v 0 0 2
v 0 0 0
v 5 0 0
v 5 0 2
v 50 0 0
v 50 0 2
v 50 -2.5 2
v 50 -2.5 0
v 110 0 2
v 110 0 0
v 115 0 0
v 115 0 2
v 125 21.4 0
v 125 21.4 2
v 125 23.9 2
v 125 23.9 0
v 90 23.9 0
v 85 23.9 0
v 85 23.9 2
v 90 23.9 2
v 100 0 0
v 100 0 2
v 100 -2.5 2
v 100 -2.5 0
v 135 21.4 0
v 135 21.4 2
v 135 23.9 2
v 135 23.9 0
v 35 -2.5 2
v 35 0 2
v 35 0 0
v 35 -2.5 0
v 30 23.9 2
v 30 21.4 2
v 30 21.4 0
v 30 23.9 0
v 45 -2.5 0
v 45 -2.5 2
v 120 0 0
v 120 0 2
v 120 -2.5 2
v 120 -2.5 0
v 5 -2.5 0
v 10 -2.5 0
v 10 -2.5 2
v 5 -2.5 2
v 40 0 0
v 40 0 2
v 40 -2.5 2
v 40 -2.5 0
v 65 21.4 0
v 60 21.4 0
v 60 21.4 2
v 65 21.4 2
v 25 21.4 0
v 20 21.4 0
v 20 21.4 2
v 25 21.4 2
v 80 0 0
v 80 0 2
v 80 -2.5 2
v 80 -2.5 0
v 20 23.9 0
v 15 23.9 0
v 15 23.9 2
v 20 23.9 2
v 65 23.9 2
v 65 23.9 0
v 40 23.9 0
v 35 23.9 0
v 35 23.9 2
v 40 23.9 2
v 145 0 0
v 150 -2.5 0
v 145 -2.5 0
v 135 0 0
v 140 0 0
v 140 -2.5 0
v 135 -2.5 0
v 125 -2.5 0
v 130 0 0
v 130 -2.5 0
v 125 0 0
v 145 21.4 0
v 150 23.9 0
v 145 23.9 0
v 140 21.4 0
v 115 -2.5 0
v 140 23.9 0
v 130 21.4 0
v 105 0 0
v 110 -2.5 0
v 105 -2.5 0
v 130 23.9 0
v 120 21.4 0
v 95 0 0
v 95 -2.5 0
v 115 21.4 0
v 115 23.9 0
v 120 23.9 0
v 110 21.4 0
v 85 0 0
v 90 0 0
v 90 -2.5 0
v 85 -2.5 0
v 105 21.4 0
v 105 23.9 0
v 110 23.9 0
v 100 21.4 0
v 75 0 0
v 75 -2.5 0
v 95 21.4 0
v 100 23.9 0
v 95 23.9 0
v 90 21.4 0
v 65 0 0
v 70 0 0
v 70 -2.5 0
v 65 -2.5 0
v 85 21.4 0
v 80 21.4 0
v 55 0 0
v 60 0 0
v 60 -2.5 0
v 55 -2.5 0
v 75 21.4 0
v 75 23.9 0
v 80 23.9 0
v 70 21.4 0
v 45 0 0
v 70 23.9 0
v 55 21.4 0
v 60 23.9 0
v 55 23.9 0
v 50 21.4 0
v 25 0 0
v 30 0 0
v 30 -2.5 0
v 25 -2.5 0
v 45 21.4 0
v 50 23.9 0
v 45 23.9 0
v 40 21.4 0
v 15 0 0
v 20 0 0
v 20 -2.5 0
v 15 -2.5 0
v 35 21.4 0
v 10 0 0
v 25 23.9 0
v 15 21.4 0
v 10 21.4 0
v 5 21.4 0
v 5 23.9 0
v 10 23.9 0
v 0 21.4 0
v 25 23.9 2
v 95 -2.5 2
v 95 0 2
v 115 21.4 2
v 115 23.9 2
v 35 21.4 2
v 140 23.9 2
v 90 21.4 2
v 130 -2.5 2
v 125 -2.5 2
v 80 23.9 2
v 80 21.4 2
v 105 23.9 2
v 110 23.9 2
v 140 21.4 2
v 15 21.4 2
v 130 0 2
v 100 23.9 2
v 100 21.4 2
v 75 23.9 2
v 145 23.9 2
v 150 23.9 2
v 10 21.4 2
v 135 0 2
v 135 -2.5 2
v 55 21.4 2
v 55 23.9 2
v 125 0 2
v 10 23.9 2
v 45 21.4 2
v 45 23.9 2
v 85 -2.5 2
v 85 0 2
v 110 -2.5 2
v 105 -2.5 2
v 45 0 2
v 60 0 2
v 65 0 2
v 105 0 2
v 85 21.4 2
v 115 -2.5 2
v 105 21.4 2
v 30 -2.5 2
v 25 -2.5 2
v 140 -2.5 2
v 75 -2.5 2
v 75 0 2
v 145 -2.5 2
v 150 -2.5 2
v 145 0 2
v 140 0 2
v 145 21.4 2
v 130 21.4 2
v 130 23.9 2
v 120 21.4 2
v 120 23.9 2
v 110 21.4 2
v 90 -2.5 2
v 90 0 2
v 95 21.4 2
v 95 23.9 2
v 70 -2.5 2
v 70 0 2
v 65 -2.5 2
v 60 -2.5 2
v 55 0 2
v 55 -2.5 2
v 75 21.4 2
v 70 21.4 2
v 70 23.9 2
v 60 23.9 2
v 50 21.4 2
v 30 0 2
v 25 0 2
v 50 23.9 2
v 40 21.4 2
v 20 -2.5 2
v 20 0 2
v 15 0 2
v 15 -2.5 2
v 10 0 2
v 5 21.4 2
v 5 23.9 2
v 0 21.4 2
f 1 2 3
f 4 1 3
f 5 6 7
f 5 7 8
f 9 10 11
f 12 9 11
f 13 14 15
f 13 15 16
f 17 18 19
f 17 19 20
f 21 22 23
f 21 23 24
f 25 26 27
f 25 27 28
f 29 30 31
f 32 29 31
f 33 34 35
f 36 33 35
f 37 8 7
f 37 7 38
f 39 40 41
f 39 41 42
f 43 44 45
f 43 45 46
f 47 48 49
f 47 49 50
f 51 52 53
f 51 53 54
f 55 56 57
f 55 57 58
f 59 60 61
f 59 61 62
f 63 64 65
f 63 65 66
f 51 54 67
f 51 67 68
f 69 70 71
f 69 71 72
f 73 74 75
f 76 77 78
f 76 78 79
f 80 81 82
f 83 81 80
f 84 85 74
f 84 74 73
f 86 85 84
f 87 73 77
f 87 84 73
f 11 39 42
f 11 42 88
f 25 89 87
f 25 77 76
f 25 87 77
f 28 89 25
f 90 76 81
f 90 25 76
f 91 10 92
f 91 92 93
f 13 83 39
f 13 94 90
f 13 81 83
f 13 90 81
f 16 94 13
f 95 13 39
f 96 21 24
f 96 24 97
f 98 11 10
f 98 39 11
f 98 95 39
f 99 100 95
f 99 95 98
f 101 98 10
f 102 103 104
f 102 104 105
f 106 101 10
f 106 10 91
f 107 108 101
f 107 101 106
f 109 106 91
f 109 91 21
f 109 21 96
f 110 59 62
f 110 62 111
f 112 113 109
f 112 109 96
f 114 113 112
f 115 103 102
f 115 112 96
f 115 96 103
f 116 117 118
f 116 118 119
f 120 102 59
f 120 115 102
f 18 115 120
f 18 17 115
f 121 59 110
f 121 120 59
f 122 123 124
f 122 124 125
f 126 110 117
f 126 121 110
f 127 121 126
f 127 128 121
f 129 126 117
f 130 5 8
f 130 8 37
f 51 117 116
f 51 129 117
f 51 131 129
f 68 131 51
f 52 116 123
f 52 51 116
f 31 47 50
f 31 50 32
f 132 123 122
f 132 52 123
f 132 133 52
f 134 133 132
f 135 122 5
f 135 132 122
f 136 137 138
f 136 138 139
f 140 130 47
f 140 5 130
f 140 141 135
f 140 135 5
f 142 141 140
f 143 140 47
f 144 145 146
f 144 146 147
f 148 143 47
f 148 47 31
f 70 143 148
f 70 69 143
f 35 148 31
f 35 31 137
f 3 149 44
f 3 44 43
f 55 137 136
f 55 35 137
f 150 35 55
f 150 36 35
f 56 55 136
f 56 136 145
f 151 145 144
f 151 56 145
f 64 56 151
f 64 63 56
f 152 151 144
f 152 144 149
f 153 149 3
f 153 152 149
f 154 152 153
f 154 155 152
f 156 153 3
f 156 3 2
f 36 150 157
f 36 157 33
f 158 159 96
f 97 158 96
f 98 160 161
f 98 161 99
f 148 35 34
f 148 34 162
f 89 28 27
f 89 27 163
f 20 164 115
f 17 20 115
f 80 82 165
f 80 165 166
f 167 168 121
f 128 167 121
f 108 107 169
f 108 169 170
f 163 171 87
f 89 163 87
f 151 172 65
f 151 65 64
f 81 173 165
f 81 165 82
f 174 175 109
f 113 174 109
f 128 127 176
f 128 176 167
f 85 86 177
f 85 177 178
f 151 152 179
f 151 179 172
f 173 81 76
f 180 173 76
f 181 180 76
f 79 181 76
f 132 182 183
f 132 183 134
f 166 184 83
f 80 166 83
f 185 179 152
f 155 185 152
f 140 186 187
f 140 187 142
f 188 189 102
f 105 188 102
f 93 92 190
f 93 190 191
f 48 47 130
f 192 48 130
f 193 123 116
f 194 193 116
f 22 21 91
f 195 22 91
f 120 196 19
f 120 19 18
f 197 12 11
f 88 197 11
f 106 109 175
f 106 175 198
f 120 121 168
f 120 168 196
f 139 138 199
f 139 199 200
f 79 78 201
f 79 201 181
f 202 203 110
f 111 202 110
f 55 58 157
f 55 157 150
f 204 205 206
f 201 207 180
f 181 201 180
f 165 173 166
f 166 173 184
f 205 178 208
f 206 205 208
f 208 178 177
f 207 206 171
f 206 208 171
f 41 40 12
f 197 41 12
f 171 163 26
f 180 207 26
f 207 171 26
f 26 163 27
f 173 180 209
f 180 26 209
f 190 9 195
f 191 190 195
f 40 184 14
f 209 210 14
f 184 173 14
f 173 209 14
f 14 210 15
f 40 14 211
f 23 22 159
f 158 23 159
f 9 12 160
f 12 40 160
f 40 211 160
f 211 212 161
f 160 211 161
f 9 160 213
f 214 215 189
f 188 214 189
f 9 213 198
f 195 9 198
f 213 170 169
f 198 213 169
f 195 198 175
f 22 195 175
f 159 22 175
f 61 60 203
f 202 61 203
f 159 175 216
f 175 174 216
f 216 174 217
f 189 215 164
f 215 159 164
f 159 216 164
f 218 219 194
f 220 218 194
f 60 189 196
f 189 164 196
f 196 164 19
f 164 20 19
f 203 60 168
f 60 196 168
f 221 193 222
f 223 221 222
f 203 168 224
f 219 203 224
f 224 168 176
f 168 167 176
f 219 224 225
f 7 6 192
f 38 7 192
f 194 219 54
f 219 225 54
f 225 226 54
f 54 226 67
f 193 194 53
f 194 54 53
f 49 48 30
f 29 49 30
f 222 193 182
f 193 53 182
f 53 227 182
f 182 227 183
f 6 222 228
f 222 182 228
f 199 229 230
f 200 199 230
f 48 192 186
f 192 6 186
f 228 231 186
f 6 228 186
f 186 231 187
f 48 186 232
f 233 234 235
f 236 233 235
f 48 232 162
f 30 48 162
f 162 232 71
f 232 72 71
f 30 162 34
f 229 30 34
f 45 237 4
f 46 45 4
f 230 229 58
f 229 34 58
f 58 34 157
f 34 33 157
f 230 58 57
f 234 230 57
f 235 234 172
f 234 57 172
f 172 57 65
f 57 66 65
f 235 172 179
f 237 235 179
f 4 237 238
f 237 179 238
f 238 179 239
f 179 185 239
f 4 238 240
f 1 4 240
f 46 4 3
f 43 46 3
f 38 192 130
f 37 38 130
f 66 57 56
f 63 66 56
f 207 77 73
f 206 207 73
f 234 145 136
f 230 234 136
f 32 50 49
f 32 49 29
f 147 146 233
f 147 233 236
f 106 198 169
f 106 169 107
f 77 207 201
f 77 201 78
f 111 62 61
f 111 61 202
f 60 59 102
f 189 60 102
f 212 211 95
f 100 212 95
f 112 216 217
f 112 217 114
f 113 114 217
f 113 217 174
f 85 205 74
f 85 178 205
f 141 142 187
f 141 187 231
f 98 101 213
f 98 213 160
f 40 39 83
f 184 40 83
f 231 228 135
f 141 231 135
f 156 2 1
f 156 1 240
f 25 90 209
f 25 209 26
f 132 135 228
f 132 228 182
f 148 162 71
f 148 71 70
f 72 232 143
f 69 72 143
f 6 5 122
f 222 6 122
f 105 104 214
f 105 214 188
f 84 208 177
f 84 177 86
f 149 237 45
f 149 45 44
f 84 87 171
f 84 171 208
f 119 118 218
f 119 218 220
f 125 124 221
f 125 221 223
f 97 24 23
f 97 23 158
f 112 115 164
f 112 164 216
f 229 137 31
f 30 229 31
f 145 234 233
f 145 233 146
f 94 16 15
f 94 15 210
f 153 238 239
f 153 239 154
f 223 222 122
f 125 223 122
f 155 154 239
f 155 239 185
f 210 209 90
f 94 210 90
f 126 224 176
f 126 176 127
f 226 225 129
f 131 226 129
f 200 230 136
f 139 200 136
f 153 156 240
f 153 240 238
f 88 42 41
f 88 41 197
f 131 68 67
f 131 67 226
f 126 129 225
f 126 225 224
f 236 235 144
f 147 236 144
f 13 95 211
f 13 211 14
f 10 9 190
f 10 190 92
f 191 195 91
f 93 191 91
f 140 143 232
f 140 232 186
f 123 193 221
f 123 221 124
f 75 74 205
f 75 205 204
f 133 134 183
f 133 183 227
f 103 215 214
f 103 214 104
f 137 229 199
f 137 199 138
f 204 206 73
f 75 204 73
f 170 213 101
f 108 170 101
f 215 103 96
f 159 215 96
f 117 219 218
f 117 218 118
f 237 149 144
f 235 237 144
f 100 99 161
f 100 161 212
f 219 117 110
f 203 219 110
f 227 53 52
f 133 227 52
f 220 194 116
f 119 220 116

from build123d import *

# Parameters (mm, degrees)
SKETCH1_W           = 150
SKETCH1_H           = 21.4
BOSS_EXTRUDE2_DEPTH = 2
SKETCH2_W           = 5
SKETCH2_H           = 2
BOSS_EXTRUDE3_DEPTH = 2.5
LPATTERN1_COUNT     = 15
LPATTERN1_PITCH     = 10
SKETCH3_W           = 5
SKETCH3_H           = 2
BOSS_EXTRUDE4_DEPTH = 2.5
LPATTERN2_COUNT     = 15
LPATTERN2_PITCH     = 10


with BuildPart() as part:
    # Sketch1 → Boss-Extrude2 (new body)
    with BuildSketch(Plane.XY):
        with Locations((75, 10.7)):
            Rectangle(SKETCH1_W, SKETCH1_H)
    extrude(amount=BOSS_EXTRUDE2_DEPTH)

    # Sketch2 → Boss-Extrude3 (add)
    with BuildSketch(Plane(origin=(0, 21.4, 0), x_dir=(1, 0, 0), z_dir=(0, 1, 0))):
        with Locations((7.5, -1)):
            Rectangle(SKETCH2_W, SKETCH2_H)
    boss_extrude3 = extrude(amount=BOSS_EXTRUDE3_DEPTH)

    # LPattern1: Boss-Extrude3 ×15
    with Locations(*[(i * LPATTERN1_PITCH, 0, 0) for i in range(1, LPATTERN1_COUNT)]):
        add(boss_extrude3)

    # Sketch3 → Boss-Extrude4 (add)
    with BuildSketch(Plane(origin=(0, 0, 0), x_dir=(-1, 0, 0), z_dir=(0, -1, 0))):
        with Locations((-7.5, -1)):
            Rectangle(SKETCH3_W, SKETCH3_H)
    boss_extrude4 = extrude(amount=BOSS_EXTRUDE4_DEPTH)

    # LPattern2: Boss-Extrude4 ×15
    with Locations(*[(i * LPATTERN2_PITCH, 0, 0) for i in range(1, LPATTERN2_COUNT)]):
        add(boss_extrude4)


solid = part.part
